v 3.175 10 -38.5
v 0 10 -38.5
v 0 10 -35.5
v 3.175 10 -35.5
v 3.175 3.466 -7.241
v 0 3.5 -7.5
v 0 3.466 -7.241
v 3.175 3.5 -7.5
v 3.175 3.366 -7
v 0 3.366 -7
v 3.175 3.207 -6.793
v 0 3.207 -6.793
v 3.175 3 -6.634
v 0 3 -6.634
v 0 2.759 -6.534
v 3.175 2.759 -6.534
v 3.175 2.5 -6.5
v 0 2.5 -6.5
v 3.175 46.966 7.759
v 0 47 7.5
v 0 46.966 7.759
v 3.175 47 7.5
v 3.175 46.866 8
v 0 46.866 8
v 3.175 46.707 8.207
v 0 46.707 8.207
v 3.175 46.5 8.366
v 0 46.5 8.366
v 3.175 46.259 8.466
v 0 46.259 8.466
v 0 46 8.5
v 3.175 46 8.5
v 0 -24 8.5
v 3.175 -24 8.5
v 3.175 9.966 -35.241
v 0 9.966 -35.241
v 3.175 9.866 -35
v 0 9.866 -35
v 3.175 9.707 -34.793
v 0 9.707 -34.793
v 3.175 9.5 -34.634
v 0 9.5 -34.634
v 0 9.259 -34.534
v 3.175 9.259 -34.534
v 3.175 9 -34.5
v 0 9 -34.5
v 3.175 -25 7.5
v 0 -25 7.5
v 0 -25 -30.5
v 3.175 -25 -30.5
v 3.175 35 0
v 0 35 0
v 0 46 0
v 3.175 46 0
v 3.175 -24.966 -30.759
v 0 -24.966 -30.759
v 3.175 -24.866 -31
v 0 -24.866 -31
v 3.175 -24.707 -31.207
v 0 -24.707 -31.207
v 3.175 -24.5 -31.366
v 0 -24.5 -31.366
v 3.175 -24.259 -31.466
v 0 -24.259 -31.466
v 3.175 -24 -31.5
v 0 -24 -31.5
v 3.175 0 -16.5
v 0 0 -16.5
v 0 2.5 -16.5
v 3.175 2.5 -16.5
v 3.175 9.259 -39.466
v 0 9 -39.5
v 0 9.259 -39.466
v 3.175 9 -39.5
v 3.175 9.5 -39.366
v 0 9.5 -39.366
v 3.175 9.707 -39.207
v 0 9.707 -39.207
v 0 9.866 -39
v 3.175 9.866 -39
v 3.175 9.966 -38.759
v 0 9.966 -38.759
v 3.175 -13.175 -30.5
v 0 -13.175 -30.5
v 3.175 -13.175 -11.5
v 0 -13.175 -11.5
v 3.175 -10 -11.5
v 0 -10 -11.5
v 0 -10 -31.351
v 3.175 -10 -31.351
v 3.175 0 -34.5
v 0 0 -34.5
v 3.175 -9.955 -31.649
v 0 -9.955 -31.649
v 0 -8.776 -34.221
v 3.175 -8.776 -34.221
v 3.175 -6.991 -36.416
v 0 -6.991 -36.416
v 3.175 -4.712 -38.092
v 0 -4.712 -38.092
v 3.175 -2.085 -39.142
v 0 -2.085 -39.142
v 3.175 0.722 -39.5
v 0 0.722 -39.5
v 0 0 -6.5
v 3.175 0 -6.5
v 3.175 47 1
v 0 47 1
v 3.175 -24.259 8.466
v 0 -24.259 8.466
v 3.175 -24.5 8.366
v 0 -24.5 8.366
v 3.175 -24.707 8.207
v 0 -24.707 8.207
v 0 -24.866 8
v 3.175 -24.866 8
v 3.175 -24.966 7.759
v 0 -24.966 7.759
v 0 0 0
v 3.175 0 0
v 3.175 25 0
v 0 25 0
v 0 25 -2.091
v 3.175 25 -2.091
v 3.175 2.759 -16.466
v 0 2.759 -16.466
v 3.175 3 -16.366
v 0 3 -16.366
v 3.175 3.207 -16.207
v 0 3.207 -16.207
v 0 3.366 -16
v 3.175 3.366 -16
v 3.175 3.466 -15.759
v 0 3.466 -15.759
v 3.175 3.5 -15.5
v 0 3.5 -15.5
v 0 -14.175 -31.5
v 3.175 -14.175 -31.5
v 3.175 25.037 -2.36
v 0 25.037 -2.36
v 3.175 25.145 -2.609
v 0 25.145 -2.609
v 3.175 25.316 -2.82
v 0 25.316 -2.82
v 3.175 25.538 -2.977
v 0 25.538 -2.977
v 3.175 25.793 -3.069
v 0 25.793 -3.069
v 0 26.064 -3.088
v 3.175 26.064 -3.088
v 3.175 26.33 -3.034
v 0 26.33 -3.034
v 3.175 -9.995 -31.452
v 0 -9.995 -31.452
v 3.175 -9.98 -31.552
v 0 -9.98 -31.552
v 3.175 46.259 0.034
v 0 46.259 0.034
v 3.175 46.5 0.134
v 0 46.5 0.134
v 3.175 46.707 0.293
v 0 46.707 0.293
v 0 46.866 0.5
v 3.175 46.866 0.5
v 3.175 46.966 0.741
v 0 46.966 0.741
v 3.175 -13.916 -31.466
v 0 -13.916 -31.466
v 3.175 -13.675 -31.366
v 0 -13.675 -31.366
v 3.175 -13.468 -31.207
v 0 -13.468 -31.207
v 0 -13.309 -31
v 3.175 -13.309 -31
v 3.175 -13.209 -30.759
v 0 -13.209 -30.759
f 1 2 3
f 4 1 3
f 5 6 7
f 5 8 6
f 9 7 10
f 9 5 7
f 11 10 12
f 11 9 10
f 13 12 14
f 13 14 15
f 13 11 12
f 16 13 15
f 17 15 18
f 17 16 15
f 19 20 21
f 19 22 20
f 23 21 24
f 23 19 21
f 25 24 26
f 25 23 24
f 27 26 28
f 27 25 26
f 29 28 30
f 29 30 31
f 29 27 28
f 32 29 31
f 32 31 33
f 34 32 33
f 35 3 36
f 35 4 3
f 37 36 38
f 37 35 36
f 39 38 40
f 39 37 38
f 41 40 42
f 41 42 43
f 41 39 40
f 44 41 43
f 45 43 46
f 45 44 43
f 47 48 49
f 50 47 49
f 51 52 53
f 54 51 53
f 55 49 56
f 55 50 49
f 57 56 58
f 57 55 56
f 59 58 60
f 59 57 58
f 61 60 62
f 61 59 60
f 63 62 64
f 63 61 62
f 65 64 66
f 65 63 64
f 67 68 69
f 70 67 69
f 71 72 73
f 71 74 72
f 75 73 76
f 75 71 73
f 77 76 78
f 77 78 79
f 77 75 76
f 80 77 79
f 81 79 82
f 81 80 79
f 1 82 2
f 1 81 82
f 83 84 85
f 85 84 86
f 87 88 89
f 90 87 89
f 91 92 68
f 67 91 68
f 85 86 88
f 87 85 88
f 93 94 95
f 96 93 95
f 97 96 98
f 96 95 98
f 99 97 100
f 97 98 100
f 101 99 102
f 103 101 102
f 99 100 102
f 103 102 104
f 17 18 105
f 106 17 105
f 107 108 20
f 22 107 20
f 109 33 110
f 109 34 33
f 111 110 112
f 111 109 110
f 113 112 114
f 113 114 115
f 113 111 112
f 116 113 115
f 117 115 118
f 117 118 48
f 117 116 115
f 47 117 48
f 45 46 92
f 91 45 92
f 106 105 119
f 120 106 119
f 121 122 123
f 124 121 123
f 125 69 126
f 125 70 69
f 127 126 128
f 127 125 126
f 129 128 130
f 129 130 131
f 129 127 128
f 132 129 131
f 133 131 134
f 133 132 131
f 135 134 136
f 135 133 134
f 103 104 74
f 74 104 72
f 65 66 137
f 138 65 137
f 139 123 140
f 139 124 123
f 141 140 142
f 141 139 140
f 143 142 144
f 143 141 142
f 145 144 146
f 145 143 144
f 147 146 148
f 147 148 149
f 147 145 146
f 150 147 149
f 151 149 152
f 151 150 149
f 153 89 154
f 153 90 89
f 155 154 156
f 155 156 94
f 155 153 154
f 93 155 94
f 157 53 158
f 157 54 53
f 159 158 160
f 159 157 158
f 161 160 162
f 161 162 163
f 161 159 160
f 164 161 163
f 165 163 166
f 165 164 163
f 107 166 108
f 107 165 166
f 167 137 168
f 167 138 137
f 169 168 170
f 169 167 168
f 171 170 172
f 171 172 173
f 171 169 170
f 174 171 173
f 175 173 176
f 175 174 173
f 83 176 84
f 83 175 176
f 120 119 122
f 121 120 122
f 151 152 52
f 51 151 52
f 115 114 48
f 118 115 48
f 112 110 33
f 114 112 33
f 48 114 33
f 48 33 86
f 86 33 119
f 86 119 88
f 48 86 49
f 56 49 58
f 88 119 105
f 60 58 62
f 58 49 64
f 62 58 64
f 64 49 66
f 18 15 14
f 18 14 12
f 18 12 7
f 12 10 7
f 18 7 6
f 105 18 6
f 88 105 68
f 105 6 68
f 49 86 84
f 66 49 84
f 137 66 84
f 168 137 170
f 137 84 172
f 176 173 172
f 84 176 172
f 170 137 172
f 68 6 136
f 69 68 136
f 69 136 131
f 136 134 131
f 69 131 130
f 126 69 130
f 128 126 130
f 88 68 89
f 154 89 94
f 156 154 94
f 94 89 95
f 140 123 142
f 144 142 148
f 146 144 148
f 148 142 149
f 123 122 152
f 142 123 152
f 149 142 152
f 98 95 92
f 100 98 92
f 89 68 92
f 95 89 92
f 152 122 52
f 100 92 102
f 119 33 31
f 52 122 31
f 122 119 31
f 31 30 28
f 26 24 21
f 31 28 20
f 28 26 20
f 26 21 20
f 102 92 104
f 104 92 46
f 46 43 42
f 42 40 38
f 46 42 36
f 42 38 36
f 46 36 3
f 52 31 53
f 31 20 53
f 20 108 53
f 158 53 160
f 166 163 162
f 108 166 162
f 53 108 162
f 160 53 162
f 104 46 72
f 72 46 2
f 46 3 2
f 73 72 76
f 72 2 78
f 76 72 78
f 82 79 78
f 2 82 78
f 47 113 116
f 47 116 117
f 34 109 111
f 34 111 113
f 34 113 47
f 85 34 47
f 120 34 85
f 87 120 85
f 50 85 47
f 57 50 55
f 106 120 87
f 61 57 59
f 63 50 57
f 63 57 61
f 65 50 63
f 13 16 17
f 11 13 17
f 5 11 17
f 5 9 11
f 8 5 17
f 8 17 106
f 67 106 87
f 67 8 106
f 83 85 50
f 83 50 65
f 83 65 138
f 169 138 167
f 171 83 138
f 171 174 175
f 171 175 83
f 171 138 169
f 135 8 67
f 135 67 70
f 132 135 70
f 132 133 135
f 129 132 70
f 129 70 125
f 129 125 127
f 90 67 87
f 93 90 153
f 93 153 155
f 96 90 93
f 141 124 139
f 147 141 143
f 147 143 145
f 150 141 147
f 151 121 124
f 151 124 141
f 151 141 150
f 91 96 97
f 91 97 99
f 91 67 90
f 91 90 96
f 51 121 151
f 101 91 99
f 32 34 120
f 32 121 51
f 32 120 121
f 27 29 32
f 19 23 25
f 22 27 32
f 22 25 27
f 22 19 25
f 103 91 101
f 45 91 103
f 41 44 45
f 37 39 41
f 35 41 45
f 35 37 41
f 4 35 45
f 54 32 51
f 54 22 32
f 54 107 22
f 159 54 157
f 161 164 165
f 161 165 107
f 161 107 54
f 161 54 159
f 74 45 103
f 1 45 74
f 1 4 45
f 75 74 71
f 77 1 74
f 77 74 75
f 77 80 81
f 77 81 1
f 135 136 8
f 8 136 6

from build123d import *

# Parameters (mm, degrees)
BOSS_EXTRUDE1_DEPTH = 3.175
FILLET1_R           = 1


with BuildPart() as part:
    # Sketch1 → Boss-Extrude1 (new body)
    with BuildSketch(Plane(origin=(0, 0, 0), x_dir=(0, 0, -1), z_dir=(1, 0, 0))):
        with BuildLine():
            Line((6.5, 0), (0, 0))
            Line((0, 0), (0, 25))
            Line((0, 25), (3.5, 25))
            Line((3.5, 25), (0, 35))
            Line((0, 35), (0, 47))
            Line((0, 47), (-8.5, 47))
            Line((-8.5, 47), (-8.5, -25))
            Line((-8.5, -25), (31.5, -25))
            Line((31.5, -25), (31.5, -13.175))
            Line((31.5, -13.175), (11.5, -13.175))
            Line((11.5, -13.175), (11.5, -10))
            Line((11.5, -10), (31.5, -10))
            ThreePointArc((31.5, -10), (37.279601373, -5.967005826), (39.5, 0.721690905))
            Line((39.5, 0.721690905), (39.5, 10))
            Line((39.5, 10), (34.5, 10))
            Line((34.5, 10), (34.5, 0))
            Line((34.5, 0), (16.5, 0))
            Line((16.5, 0), (16.5, 3.5))
            Line((16.5, 3.5), (6.5, 3.5))
            Line((6.5, 3.5), (6.5, 0))
        make_face()
    extrude(amount=BOSS_EXTRUDE1_DEPTH)

    # Fillet1
    fillet1_edges = [part.edges().sort_by_distance(p)[0] for p in [
        (1.5875, -10, -31.5),
        (1.5875, -13.175, -31.5),
        (1.5875, -25, -31.5),
        (1.5875, -25, 8.5),
        (1.5875, 47, 8.5),
        (1.5875, 47, 0),
        (1.5875, 25, -3.5),
        (1.5875, 3.5, -6.5),
        (1.5875, 3.5, -16.5),
        (1.5875, 10, -34.5),
        (1.5875, 10, -39.5),
    ]]
    fillet(fillet1_edges, radius=FILLET1_R)


solid = part.part
